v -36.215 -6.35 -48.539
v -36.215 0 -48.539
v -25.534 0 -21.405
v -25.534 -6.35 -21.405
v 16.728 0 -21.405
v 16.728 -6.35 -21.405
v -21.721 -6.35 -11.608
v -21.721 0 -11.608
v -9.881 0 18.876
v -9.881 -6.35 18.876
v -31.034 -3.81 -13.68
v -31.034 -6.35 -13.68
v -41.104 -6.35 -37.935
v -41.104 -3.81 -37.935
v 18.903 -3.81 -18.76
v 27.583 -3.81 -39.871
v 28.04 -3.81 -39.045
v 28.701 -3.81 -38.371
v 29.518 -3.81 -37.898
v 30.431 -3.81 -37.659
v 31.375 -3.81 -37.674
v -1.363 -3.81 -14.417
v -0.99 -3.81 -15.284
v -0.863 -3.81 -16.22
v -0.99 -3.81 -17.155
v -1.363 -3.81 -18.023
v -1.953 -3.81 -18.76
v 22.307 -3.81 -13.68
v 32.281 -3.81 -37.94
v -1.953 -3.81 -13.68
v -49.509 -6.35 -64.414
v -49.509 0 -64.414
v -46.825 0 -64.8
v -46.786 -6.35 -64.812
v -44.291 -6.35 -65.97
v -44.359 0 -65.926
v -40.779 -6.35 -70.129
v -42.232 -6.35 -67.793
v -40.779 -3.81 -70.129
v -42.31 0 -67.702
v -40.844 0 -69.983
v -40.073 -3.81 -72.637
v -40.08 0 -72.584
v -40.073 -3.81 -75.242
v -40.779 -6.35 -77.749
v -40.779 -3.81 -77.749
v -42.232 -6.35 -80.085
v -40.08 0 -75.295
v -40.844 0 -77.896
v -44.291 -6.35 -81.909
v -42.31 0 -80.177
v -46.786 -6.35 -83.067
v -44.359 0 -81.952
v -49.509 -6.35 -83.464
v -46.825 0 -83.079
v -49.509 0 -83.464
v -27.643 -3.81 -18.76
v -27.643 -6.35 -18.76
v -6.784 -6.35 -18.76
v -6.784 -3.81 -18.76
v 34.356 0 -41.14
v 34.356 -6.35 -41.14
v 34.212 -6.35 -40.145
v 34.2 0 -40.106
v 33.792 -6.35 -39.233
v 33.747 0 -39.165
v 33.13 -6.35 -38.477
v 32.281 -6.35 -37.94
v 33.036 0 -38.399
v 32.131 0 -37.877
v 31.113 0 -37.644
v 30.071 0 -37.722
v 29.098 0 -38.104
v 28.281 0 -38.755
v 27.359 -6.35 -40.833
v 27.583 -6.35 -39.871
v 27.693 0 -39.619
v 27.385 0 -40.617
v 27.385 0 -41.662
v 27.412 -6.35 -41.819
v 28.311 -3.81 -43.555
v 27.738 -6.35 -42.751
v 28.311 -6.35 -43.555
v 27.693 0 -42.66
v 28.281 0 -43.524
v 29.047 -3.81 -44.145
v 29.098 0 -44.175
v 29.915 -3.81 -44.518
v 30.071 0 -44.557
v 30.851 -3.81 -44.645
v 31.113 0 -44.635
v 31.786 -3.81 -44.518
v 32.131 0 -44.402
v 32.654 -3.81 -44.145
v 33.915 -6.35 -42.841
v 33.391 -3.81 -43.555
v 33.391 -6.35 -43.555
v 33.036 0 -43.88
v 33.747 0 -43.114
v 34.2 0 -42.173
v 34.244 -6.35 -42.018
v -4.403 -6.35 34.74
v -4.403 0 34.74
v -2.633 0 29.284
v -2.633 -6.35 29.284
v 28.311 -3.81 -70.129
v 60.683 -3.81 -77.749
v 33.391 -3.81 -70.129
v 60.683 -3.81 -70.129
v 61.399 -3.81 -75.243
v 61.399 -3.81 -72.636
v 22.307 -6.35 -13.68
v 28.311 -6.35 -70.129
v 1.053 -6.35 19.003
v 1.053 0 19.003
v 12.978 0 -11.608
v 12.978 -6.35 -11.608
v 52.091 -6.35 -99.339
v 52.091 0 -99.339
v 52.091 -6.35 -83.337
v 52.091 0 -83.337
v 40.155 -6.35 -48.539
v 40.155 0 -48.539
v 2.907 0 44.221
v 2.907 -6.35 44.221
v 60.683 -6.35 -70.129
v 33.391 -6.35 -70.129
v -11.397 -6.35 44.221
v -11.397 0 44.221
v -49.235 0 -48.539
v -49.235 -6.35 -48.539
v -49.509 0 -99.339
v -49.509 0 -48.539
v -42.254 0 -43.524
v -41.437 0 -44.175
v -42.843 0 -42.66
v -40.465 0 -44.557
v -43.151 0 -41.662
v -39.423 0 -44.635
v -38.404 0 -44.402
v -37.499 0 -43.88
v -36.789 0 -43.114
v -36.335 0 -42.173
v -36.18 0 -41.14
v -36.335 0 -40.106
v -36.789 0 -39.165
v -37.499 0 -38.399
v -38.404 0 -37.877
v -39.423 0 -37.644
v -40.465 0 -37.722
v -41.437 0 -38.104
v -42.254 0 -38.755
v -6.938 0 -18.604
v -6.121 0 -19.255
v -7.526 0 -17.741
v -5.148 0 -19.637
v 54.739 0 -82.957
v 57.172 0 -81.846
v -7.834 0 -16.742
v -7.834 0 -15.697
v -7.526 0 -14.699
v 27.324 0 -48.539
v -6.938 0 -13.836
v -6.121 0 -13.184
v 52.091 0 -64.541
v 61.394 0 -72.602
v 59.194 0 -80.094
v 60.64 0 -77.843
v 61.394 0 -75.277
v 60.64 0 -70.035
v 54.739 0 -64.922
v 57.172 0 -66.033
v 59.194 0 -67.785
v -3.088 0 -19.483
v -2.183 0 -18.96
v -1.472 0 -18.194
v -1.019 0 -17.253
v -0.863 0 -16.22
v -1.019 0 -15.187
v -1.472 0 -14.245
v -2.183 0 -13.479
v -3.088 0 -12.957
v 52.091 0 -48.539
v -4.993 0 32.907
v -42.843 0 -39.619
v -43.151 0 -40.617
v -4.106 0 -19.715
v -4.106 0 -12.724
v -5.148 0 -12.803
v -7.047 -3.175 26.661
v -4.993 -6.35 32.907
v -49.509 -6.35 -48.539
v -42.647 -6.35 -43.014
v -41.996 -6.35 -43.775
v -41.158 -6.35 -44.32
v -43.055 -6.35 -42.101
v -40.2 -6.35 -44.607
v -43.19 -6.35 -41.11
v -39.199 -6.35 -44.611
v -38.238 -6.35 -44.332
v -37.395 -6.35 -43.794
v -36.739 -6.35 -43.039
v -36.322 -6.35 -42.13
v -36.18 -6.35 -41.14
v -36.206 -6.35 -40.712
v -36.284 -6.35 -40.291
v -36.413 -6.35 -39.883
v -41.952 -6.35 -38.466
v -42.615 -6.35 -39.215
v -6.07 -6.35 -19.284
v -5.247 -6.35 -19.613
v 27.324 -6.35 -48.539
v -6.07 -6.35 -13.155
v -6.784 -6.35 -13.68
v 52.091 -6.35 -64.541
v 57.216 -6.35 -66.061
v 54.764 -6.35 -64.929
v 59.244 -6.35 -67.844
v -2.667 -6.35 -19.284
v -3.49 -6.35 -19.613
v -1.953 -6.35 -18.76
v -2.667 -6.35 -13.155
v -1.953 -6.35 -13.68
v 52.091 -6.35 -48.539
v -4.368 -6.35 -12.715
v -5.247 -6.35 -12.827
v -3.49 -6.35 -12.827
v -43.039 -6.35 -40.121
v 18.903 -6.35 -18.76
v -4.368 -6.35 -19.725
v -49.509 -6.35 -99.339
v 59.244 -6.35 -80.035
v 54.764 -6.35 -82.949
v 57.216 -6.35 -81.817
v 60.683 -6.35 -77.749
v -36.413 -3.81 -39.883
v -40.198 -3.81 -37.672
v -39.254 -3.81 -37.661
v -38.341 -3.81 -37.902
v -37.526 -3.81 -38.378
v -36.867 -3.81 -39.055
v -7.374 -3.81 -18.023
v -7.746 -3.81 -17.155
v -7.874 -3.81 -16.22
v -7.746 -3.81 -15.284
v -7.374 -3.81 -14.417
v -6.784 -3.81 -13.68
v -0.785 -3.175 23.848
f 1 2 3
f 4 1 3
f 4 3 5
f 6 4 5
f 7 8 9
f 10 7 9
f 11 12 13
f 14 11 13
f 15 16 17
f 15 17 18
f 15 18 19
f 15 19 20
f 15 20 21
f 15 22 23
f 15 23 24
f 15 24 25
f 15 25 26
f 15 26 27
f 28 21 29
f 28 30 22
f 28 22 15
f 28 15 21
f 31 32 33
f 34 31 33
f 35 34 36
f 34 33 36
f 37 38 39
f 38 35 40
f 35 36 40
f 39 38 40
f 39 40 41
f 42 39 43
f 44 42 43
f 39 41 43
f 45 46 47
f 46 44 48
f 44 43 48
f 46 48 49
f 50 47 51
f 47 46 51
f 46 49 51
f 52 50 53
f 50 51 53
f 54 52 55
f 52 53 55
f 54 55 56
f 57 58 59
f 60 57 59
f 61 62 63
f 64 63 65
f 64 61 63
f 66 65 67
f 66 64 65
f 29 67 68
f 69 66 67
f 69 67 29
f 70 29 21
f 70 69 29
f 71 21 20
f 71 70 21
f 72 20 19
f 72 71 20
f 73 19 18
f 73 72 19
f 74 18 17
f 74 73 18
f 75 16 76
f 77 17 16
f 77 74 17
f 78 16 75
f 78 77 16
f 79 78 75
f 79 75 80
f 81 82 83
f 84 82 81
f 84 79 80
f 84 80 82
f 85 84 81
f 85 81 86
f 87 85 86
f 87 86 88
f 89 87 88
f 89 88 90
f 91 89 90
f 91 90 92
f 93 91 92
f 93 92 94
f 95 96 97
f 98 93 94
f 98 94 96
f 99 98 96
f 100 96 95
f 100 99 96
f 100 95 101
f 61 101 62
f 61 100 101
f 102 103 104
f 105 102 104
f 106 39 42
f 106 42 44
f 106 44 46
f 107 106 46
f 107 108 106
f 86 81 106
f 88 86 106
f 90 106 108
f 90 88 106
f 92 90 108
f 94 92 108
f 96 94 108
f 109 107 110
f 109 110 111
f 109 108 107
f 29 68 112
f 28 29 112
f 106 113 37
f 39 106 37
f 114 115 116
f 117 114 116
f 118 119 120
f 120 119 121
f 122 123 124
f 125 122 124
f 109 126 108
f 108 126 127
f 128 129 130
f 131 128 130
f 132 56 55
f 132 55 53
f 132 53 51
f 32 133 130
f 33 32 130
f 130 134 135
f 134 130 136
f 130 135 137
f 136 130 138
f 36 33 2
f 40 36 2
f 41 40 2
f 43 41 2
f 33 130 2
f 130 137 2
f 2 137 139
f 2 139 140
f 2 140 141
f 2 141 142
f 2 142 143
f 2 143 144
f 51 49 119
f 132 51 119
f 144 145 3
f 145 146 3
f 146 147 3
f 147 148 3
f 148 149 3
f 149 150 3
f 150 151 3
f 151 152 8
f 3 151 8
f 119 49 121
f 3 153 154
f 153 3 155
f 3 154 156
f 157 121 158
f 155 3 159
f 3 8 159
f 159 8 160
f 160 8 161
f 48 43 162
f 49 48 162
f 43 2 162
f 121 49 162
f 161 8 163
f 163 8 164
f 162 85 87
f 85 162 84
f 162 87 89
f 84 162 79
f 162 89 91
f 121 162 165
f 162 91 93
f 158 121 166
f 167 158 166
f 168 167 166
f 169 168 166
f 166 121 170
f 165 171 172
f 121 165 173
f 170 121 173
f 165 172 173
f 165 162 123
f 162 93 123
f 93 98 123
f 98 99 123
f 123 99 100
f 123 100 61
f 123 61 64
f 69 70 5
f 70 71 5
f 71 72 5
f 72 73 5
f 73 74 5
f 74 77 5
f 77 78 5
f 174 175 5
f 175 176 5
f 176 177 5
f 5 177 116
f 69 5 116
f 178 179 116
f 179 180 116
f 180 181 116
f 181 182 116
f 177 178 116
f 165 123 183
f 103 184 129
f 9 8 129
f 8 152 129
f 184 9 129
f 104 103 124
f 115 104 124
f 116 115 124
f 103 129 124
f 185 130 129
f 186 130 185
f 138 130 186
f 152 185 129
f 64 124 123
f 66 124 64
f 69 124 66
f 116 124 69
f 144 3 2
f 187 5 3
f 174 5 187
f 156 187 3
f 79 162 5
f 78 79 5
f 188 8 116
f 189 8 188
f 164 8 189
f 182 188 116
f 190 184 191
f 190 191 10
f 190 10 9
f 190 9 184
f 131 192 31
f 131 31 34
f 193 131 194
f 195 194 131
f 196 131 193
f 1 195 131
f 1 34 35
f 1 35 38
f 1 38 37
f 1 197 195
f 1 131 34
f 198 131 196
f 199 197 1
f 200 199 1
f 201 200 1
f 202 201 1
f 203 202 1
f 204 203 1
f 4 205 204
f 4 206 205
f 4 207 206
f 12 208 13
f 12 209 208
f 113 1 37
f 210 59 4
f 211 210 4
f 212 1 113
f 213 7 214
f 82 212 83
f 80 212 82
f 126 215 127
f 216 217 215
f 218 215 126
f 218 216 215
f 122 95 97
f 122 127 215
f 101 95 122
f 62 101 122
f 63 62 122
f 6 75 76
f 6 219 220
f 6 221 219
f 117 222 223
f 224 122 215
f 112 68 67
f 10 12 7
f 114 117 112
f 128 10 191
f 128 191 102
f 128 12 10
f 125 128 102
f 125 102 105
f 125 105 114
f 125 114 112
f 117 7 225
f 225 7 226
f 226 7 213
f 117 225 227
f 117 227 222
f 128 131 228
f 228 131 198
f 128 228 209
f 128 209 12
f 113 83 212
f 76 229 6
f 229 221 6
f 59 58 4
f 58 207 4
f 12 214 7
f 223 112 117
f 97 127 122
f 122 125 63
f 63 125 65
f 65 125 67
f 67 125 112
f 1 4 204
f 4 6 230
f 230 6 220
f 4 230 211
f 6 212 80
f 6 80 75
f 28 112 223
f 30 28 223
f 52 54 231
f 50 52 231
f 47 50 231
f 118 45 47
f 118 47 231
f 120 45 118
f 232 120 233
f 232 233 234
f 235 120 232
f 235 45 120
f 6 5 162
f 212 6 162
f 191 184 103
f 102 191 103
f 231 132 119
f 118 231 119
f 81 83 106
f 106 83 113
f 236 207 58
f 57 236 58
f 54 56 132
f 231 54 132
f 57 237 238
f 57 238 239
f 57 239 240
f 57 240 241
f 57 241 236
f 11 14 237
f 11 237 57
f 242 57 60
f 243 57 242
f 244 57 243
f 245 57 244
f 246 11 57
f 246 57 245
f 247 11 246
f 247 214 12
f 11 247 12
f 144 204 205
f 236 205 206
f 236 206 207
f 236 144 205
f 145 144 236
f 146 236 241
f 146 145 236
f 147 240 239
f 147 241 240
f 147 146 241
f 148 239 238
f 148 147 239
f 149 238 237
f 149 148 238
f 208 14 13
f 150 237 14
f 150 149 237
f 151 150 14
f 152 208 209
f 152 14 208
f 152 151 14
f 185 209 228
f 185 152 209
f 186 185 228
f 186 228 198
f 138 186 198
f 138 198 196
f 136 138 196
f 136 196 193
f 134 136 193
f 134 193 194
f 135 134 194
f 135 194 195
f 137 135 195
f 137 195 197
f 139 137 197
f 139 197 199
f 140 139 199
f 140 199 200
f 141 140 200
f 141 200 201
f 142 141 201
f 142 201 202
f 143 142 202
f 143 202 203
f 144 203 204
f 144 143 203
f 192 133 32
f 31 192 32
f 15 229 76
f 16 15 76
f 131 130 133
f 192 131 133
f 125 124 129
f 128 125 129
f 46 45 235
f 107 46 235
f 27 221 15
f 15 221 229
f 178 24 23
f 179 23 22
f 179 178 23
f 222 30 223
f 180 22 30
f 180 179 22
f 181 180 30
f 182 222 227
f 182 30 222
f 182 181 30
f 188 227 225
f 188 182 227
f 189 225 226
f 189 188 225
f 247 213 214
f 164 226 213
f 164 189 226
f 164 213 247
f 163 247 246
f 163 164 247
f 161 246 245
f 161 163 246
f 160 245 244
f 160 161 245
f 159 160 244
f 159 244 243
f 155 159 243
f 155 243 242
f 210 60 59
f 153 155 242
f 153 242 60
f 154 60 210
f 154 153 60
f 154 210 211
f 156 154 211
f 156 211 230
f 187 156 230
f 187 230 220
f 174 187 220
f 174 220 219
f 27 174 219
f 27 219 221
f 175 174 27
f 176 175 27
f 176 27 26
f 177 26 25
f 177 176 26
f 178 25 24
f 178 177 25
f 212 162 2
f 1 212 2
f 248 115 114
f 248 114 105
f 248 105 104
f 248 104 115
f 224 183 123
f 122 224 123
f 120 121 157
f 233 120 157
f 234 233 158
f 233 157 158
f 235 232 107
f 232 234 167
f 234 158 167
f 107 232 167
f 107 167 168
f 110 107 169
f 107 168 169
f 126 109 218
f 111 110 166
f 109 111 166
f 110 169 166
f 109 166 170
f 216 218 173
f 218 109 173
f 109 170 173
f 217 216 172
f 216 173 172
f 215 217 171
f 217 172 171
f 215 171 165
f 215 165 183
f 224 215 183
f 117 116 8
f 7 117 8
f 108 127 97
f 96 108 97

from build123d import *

# Parameters (mm, degrees)
F0_R     = 3.5052
F1_DEPTH = 6.35
F3_DEPTH = 2.54


with BuildPart() as f1:
    # F0 (on Front) → F1 (new body)
    with BuildSketch(Plane.XZ):
        Polygon((-11.3974893229, 44.2205731771), (-49.2346257812, -48.5394), (-36.2149429687, -48.5394), (-25.533746875, -21.4045270833), (16.7275536458, -21.4045270833), (27.3244799479, -48.5394), (40.1545557292, -48.5394), (2.9073078125, 44.2205731771), align=None)
        with Locations((-39.6848618984, -41.1395020783)):
            Circle(F0_R, mode=Mode.SUBTRACT)
        with Locations((30.8506265283, -41.1395020783)):
            Circle(F0_R, mode=Mode.SUBTRACT)
        with Locations((-4.3683550321, -16.2198841572)):
            Circle(F0_R, mode=Mode.SUBTRACT)
        with BuildLine():
            Line((-4.9929851562, 32.9073536458), (-4.4030966146, 34.7402216146))
            Line((-4.4030966146, 34.7402216146), (-2.6334309896, 29.2837526042))
            add(Edge.make_bspline(
                [(1.0533723958, 19.0028380208), (-0.7794955729, 23.5534067708), (-2.6334309896, 29.2837526042)],
                knots=[0, 0, 0, 1, 1, 1], degree=2))
            Line((1.0533723958, 19.0028380208), (12.9775479167, -11.6081638021))
            Line((12.9775479167, -11.6081638021), (-21.7205388021, -11.6081638021))
            Line((-21.7205388021, -11.6081638021), (-9.8806330729, 18.8764333333))
            add(Edge.make_bspline(
                [(-4.9929851562, 32.9073536458), (-6.6573135417, 27.4298171875), (-9.8806330729, 18.8764333333)],
                knots=[0, 0, 0, 1, 1, 1], degree=2))
        make_face(mode=Mode.SUBTRACT)
        with BuildLine():
            Line((-49.2346257812, -48.5394), (-49.5085026042, -48.5394))
            Line((-49.5085026042, -48.5394), (-49.5085026042, -64.4144))
            ThreePointArc((-49.5085026042, -64.4144), (-39.9835026042, -73.9394), (-49.5085026042, -83.4644))
            Line((-49.5085026042, -83.4644), (-49.5085026042, -99.3394))
            Line((-49.5085026042, -99.3394), (52.0914973958, -99.3394))
            Line((52.0914973958, -99.3394), (52.0914973958, -83.3374))
            ThreePointArc((52.0914973958, -83.3374), (61.4894973958, -73.9394), (52.0914973958, -64.5414))
            Line((52.0914973958, -64.5414), (52.0914973958, -48.5394))
            Line((52.0914973958, -48.5394), (40.1545557292, -48.5394))
            Line((40.1545557292, -48.5394), (27.3244799479, -48.5394))
            Line((27.3244799479, -48.5394), (-36.2149429687, -48.5394))
            Line((-36.2149429687, -48.5394), (-49.2346257812, -48.5394))
        make_face()
    extrude(amount=F1_DEPTH)

    # F2 (on face) → F3 (cut)
    with BuildSketch(Plane.XZ.offset(6.35)):
        with BuildLine():
            ThreePointArc((-6.7838939248, -18.7598839402), (-7.8735550321, -16.2198841572), (-6.7838939248, -13.6798843741))
            Line((-6.7838939248, -13.6798843741), (-31.0344029758, -13.6798843741))
            Line((-31.0344029758, -13.6798843741), (-41.1044888823, -37.9346485299))
            ThreePointArc((-41.1044888823, -37.9346485299), (-38.340810813, -37.902226415), (-36.4127835596, -39.882549261))
            Line((-36.4127835596, -39.882549261), (-27.6430815337, -18.7598839402))
            Line((-27.6430815337, -18.7598839402), (-6.7838939248, -18.7598839402))
        make_face()
        with BuildLine():
            ThreePointArc((27.5828955219, -39.8712903019), (29.5177289249, -37.8976182095), (32.2812779405, -37.9395546449))
            Line((32.2812779405, -37.9395546449), (22.3069365793, -13.6798843741))
            Line((22.3069365793, -13.6798843741), (-1.9528161394, -13.6798843741))
            ThreePointArc((-1.9528161394, -13.6798843741), (-1.1470684904, -14.8379507085), (-0.8631550321, -16.2198841572))
            ThreePointArc((-0.8631550321, -16.2198841572), (-1.1470684904, -17.6018176059), (-1.9528161394, -18.7598839402))
            Line((-1.9528161394, -18.7598839402), (18.9029600028, -18.7598839402))
            Line((18.9029600028, -18.7598839402), (27.5828955219, -39.8712903019))
        make_face()
        with BuildLine():
            Line((33.3906265283, -70.1294), (33.3906265283, -43.5550407429))
            ThreePointArc((33.3906265283, -43.5550407429), (30.8506265283, -44.6447020783), (28.3106265283, -43.5550407429))
            Line((28.3106265283, -43.5550407429), (28.3106265283, -70.1294))
            Line((28.3106265283, -70.1294), (-40.7786959053, -70.1294))
            ThreePointArc((-40.7786959053, -70.1294), (-39.9835026042, -73.9394), (-40.7786959053, -77.7494))
            Line((-40.7786959053, -77.7494), (60.6825569347, -77.7494))
            ThreePointArc((60.6825569347, -77.7494), (61.4894973958, -73.9394), (60.6825569347, -70.1294))
            Line((60.6825569347, -70.1294), (33.3906265283, -70.1294))
        make_face()
    extrude(amount=-F3_DEPTH, mode=Mode.SUBTRACT)


solid = f1.part
